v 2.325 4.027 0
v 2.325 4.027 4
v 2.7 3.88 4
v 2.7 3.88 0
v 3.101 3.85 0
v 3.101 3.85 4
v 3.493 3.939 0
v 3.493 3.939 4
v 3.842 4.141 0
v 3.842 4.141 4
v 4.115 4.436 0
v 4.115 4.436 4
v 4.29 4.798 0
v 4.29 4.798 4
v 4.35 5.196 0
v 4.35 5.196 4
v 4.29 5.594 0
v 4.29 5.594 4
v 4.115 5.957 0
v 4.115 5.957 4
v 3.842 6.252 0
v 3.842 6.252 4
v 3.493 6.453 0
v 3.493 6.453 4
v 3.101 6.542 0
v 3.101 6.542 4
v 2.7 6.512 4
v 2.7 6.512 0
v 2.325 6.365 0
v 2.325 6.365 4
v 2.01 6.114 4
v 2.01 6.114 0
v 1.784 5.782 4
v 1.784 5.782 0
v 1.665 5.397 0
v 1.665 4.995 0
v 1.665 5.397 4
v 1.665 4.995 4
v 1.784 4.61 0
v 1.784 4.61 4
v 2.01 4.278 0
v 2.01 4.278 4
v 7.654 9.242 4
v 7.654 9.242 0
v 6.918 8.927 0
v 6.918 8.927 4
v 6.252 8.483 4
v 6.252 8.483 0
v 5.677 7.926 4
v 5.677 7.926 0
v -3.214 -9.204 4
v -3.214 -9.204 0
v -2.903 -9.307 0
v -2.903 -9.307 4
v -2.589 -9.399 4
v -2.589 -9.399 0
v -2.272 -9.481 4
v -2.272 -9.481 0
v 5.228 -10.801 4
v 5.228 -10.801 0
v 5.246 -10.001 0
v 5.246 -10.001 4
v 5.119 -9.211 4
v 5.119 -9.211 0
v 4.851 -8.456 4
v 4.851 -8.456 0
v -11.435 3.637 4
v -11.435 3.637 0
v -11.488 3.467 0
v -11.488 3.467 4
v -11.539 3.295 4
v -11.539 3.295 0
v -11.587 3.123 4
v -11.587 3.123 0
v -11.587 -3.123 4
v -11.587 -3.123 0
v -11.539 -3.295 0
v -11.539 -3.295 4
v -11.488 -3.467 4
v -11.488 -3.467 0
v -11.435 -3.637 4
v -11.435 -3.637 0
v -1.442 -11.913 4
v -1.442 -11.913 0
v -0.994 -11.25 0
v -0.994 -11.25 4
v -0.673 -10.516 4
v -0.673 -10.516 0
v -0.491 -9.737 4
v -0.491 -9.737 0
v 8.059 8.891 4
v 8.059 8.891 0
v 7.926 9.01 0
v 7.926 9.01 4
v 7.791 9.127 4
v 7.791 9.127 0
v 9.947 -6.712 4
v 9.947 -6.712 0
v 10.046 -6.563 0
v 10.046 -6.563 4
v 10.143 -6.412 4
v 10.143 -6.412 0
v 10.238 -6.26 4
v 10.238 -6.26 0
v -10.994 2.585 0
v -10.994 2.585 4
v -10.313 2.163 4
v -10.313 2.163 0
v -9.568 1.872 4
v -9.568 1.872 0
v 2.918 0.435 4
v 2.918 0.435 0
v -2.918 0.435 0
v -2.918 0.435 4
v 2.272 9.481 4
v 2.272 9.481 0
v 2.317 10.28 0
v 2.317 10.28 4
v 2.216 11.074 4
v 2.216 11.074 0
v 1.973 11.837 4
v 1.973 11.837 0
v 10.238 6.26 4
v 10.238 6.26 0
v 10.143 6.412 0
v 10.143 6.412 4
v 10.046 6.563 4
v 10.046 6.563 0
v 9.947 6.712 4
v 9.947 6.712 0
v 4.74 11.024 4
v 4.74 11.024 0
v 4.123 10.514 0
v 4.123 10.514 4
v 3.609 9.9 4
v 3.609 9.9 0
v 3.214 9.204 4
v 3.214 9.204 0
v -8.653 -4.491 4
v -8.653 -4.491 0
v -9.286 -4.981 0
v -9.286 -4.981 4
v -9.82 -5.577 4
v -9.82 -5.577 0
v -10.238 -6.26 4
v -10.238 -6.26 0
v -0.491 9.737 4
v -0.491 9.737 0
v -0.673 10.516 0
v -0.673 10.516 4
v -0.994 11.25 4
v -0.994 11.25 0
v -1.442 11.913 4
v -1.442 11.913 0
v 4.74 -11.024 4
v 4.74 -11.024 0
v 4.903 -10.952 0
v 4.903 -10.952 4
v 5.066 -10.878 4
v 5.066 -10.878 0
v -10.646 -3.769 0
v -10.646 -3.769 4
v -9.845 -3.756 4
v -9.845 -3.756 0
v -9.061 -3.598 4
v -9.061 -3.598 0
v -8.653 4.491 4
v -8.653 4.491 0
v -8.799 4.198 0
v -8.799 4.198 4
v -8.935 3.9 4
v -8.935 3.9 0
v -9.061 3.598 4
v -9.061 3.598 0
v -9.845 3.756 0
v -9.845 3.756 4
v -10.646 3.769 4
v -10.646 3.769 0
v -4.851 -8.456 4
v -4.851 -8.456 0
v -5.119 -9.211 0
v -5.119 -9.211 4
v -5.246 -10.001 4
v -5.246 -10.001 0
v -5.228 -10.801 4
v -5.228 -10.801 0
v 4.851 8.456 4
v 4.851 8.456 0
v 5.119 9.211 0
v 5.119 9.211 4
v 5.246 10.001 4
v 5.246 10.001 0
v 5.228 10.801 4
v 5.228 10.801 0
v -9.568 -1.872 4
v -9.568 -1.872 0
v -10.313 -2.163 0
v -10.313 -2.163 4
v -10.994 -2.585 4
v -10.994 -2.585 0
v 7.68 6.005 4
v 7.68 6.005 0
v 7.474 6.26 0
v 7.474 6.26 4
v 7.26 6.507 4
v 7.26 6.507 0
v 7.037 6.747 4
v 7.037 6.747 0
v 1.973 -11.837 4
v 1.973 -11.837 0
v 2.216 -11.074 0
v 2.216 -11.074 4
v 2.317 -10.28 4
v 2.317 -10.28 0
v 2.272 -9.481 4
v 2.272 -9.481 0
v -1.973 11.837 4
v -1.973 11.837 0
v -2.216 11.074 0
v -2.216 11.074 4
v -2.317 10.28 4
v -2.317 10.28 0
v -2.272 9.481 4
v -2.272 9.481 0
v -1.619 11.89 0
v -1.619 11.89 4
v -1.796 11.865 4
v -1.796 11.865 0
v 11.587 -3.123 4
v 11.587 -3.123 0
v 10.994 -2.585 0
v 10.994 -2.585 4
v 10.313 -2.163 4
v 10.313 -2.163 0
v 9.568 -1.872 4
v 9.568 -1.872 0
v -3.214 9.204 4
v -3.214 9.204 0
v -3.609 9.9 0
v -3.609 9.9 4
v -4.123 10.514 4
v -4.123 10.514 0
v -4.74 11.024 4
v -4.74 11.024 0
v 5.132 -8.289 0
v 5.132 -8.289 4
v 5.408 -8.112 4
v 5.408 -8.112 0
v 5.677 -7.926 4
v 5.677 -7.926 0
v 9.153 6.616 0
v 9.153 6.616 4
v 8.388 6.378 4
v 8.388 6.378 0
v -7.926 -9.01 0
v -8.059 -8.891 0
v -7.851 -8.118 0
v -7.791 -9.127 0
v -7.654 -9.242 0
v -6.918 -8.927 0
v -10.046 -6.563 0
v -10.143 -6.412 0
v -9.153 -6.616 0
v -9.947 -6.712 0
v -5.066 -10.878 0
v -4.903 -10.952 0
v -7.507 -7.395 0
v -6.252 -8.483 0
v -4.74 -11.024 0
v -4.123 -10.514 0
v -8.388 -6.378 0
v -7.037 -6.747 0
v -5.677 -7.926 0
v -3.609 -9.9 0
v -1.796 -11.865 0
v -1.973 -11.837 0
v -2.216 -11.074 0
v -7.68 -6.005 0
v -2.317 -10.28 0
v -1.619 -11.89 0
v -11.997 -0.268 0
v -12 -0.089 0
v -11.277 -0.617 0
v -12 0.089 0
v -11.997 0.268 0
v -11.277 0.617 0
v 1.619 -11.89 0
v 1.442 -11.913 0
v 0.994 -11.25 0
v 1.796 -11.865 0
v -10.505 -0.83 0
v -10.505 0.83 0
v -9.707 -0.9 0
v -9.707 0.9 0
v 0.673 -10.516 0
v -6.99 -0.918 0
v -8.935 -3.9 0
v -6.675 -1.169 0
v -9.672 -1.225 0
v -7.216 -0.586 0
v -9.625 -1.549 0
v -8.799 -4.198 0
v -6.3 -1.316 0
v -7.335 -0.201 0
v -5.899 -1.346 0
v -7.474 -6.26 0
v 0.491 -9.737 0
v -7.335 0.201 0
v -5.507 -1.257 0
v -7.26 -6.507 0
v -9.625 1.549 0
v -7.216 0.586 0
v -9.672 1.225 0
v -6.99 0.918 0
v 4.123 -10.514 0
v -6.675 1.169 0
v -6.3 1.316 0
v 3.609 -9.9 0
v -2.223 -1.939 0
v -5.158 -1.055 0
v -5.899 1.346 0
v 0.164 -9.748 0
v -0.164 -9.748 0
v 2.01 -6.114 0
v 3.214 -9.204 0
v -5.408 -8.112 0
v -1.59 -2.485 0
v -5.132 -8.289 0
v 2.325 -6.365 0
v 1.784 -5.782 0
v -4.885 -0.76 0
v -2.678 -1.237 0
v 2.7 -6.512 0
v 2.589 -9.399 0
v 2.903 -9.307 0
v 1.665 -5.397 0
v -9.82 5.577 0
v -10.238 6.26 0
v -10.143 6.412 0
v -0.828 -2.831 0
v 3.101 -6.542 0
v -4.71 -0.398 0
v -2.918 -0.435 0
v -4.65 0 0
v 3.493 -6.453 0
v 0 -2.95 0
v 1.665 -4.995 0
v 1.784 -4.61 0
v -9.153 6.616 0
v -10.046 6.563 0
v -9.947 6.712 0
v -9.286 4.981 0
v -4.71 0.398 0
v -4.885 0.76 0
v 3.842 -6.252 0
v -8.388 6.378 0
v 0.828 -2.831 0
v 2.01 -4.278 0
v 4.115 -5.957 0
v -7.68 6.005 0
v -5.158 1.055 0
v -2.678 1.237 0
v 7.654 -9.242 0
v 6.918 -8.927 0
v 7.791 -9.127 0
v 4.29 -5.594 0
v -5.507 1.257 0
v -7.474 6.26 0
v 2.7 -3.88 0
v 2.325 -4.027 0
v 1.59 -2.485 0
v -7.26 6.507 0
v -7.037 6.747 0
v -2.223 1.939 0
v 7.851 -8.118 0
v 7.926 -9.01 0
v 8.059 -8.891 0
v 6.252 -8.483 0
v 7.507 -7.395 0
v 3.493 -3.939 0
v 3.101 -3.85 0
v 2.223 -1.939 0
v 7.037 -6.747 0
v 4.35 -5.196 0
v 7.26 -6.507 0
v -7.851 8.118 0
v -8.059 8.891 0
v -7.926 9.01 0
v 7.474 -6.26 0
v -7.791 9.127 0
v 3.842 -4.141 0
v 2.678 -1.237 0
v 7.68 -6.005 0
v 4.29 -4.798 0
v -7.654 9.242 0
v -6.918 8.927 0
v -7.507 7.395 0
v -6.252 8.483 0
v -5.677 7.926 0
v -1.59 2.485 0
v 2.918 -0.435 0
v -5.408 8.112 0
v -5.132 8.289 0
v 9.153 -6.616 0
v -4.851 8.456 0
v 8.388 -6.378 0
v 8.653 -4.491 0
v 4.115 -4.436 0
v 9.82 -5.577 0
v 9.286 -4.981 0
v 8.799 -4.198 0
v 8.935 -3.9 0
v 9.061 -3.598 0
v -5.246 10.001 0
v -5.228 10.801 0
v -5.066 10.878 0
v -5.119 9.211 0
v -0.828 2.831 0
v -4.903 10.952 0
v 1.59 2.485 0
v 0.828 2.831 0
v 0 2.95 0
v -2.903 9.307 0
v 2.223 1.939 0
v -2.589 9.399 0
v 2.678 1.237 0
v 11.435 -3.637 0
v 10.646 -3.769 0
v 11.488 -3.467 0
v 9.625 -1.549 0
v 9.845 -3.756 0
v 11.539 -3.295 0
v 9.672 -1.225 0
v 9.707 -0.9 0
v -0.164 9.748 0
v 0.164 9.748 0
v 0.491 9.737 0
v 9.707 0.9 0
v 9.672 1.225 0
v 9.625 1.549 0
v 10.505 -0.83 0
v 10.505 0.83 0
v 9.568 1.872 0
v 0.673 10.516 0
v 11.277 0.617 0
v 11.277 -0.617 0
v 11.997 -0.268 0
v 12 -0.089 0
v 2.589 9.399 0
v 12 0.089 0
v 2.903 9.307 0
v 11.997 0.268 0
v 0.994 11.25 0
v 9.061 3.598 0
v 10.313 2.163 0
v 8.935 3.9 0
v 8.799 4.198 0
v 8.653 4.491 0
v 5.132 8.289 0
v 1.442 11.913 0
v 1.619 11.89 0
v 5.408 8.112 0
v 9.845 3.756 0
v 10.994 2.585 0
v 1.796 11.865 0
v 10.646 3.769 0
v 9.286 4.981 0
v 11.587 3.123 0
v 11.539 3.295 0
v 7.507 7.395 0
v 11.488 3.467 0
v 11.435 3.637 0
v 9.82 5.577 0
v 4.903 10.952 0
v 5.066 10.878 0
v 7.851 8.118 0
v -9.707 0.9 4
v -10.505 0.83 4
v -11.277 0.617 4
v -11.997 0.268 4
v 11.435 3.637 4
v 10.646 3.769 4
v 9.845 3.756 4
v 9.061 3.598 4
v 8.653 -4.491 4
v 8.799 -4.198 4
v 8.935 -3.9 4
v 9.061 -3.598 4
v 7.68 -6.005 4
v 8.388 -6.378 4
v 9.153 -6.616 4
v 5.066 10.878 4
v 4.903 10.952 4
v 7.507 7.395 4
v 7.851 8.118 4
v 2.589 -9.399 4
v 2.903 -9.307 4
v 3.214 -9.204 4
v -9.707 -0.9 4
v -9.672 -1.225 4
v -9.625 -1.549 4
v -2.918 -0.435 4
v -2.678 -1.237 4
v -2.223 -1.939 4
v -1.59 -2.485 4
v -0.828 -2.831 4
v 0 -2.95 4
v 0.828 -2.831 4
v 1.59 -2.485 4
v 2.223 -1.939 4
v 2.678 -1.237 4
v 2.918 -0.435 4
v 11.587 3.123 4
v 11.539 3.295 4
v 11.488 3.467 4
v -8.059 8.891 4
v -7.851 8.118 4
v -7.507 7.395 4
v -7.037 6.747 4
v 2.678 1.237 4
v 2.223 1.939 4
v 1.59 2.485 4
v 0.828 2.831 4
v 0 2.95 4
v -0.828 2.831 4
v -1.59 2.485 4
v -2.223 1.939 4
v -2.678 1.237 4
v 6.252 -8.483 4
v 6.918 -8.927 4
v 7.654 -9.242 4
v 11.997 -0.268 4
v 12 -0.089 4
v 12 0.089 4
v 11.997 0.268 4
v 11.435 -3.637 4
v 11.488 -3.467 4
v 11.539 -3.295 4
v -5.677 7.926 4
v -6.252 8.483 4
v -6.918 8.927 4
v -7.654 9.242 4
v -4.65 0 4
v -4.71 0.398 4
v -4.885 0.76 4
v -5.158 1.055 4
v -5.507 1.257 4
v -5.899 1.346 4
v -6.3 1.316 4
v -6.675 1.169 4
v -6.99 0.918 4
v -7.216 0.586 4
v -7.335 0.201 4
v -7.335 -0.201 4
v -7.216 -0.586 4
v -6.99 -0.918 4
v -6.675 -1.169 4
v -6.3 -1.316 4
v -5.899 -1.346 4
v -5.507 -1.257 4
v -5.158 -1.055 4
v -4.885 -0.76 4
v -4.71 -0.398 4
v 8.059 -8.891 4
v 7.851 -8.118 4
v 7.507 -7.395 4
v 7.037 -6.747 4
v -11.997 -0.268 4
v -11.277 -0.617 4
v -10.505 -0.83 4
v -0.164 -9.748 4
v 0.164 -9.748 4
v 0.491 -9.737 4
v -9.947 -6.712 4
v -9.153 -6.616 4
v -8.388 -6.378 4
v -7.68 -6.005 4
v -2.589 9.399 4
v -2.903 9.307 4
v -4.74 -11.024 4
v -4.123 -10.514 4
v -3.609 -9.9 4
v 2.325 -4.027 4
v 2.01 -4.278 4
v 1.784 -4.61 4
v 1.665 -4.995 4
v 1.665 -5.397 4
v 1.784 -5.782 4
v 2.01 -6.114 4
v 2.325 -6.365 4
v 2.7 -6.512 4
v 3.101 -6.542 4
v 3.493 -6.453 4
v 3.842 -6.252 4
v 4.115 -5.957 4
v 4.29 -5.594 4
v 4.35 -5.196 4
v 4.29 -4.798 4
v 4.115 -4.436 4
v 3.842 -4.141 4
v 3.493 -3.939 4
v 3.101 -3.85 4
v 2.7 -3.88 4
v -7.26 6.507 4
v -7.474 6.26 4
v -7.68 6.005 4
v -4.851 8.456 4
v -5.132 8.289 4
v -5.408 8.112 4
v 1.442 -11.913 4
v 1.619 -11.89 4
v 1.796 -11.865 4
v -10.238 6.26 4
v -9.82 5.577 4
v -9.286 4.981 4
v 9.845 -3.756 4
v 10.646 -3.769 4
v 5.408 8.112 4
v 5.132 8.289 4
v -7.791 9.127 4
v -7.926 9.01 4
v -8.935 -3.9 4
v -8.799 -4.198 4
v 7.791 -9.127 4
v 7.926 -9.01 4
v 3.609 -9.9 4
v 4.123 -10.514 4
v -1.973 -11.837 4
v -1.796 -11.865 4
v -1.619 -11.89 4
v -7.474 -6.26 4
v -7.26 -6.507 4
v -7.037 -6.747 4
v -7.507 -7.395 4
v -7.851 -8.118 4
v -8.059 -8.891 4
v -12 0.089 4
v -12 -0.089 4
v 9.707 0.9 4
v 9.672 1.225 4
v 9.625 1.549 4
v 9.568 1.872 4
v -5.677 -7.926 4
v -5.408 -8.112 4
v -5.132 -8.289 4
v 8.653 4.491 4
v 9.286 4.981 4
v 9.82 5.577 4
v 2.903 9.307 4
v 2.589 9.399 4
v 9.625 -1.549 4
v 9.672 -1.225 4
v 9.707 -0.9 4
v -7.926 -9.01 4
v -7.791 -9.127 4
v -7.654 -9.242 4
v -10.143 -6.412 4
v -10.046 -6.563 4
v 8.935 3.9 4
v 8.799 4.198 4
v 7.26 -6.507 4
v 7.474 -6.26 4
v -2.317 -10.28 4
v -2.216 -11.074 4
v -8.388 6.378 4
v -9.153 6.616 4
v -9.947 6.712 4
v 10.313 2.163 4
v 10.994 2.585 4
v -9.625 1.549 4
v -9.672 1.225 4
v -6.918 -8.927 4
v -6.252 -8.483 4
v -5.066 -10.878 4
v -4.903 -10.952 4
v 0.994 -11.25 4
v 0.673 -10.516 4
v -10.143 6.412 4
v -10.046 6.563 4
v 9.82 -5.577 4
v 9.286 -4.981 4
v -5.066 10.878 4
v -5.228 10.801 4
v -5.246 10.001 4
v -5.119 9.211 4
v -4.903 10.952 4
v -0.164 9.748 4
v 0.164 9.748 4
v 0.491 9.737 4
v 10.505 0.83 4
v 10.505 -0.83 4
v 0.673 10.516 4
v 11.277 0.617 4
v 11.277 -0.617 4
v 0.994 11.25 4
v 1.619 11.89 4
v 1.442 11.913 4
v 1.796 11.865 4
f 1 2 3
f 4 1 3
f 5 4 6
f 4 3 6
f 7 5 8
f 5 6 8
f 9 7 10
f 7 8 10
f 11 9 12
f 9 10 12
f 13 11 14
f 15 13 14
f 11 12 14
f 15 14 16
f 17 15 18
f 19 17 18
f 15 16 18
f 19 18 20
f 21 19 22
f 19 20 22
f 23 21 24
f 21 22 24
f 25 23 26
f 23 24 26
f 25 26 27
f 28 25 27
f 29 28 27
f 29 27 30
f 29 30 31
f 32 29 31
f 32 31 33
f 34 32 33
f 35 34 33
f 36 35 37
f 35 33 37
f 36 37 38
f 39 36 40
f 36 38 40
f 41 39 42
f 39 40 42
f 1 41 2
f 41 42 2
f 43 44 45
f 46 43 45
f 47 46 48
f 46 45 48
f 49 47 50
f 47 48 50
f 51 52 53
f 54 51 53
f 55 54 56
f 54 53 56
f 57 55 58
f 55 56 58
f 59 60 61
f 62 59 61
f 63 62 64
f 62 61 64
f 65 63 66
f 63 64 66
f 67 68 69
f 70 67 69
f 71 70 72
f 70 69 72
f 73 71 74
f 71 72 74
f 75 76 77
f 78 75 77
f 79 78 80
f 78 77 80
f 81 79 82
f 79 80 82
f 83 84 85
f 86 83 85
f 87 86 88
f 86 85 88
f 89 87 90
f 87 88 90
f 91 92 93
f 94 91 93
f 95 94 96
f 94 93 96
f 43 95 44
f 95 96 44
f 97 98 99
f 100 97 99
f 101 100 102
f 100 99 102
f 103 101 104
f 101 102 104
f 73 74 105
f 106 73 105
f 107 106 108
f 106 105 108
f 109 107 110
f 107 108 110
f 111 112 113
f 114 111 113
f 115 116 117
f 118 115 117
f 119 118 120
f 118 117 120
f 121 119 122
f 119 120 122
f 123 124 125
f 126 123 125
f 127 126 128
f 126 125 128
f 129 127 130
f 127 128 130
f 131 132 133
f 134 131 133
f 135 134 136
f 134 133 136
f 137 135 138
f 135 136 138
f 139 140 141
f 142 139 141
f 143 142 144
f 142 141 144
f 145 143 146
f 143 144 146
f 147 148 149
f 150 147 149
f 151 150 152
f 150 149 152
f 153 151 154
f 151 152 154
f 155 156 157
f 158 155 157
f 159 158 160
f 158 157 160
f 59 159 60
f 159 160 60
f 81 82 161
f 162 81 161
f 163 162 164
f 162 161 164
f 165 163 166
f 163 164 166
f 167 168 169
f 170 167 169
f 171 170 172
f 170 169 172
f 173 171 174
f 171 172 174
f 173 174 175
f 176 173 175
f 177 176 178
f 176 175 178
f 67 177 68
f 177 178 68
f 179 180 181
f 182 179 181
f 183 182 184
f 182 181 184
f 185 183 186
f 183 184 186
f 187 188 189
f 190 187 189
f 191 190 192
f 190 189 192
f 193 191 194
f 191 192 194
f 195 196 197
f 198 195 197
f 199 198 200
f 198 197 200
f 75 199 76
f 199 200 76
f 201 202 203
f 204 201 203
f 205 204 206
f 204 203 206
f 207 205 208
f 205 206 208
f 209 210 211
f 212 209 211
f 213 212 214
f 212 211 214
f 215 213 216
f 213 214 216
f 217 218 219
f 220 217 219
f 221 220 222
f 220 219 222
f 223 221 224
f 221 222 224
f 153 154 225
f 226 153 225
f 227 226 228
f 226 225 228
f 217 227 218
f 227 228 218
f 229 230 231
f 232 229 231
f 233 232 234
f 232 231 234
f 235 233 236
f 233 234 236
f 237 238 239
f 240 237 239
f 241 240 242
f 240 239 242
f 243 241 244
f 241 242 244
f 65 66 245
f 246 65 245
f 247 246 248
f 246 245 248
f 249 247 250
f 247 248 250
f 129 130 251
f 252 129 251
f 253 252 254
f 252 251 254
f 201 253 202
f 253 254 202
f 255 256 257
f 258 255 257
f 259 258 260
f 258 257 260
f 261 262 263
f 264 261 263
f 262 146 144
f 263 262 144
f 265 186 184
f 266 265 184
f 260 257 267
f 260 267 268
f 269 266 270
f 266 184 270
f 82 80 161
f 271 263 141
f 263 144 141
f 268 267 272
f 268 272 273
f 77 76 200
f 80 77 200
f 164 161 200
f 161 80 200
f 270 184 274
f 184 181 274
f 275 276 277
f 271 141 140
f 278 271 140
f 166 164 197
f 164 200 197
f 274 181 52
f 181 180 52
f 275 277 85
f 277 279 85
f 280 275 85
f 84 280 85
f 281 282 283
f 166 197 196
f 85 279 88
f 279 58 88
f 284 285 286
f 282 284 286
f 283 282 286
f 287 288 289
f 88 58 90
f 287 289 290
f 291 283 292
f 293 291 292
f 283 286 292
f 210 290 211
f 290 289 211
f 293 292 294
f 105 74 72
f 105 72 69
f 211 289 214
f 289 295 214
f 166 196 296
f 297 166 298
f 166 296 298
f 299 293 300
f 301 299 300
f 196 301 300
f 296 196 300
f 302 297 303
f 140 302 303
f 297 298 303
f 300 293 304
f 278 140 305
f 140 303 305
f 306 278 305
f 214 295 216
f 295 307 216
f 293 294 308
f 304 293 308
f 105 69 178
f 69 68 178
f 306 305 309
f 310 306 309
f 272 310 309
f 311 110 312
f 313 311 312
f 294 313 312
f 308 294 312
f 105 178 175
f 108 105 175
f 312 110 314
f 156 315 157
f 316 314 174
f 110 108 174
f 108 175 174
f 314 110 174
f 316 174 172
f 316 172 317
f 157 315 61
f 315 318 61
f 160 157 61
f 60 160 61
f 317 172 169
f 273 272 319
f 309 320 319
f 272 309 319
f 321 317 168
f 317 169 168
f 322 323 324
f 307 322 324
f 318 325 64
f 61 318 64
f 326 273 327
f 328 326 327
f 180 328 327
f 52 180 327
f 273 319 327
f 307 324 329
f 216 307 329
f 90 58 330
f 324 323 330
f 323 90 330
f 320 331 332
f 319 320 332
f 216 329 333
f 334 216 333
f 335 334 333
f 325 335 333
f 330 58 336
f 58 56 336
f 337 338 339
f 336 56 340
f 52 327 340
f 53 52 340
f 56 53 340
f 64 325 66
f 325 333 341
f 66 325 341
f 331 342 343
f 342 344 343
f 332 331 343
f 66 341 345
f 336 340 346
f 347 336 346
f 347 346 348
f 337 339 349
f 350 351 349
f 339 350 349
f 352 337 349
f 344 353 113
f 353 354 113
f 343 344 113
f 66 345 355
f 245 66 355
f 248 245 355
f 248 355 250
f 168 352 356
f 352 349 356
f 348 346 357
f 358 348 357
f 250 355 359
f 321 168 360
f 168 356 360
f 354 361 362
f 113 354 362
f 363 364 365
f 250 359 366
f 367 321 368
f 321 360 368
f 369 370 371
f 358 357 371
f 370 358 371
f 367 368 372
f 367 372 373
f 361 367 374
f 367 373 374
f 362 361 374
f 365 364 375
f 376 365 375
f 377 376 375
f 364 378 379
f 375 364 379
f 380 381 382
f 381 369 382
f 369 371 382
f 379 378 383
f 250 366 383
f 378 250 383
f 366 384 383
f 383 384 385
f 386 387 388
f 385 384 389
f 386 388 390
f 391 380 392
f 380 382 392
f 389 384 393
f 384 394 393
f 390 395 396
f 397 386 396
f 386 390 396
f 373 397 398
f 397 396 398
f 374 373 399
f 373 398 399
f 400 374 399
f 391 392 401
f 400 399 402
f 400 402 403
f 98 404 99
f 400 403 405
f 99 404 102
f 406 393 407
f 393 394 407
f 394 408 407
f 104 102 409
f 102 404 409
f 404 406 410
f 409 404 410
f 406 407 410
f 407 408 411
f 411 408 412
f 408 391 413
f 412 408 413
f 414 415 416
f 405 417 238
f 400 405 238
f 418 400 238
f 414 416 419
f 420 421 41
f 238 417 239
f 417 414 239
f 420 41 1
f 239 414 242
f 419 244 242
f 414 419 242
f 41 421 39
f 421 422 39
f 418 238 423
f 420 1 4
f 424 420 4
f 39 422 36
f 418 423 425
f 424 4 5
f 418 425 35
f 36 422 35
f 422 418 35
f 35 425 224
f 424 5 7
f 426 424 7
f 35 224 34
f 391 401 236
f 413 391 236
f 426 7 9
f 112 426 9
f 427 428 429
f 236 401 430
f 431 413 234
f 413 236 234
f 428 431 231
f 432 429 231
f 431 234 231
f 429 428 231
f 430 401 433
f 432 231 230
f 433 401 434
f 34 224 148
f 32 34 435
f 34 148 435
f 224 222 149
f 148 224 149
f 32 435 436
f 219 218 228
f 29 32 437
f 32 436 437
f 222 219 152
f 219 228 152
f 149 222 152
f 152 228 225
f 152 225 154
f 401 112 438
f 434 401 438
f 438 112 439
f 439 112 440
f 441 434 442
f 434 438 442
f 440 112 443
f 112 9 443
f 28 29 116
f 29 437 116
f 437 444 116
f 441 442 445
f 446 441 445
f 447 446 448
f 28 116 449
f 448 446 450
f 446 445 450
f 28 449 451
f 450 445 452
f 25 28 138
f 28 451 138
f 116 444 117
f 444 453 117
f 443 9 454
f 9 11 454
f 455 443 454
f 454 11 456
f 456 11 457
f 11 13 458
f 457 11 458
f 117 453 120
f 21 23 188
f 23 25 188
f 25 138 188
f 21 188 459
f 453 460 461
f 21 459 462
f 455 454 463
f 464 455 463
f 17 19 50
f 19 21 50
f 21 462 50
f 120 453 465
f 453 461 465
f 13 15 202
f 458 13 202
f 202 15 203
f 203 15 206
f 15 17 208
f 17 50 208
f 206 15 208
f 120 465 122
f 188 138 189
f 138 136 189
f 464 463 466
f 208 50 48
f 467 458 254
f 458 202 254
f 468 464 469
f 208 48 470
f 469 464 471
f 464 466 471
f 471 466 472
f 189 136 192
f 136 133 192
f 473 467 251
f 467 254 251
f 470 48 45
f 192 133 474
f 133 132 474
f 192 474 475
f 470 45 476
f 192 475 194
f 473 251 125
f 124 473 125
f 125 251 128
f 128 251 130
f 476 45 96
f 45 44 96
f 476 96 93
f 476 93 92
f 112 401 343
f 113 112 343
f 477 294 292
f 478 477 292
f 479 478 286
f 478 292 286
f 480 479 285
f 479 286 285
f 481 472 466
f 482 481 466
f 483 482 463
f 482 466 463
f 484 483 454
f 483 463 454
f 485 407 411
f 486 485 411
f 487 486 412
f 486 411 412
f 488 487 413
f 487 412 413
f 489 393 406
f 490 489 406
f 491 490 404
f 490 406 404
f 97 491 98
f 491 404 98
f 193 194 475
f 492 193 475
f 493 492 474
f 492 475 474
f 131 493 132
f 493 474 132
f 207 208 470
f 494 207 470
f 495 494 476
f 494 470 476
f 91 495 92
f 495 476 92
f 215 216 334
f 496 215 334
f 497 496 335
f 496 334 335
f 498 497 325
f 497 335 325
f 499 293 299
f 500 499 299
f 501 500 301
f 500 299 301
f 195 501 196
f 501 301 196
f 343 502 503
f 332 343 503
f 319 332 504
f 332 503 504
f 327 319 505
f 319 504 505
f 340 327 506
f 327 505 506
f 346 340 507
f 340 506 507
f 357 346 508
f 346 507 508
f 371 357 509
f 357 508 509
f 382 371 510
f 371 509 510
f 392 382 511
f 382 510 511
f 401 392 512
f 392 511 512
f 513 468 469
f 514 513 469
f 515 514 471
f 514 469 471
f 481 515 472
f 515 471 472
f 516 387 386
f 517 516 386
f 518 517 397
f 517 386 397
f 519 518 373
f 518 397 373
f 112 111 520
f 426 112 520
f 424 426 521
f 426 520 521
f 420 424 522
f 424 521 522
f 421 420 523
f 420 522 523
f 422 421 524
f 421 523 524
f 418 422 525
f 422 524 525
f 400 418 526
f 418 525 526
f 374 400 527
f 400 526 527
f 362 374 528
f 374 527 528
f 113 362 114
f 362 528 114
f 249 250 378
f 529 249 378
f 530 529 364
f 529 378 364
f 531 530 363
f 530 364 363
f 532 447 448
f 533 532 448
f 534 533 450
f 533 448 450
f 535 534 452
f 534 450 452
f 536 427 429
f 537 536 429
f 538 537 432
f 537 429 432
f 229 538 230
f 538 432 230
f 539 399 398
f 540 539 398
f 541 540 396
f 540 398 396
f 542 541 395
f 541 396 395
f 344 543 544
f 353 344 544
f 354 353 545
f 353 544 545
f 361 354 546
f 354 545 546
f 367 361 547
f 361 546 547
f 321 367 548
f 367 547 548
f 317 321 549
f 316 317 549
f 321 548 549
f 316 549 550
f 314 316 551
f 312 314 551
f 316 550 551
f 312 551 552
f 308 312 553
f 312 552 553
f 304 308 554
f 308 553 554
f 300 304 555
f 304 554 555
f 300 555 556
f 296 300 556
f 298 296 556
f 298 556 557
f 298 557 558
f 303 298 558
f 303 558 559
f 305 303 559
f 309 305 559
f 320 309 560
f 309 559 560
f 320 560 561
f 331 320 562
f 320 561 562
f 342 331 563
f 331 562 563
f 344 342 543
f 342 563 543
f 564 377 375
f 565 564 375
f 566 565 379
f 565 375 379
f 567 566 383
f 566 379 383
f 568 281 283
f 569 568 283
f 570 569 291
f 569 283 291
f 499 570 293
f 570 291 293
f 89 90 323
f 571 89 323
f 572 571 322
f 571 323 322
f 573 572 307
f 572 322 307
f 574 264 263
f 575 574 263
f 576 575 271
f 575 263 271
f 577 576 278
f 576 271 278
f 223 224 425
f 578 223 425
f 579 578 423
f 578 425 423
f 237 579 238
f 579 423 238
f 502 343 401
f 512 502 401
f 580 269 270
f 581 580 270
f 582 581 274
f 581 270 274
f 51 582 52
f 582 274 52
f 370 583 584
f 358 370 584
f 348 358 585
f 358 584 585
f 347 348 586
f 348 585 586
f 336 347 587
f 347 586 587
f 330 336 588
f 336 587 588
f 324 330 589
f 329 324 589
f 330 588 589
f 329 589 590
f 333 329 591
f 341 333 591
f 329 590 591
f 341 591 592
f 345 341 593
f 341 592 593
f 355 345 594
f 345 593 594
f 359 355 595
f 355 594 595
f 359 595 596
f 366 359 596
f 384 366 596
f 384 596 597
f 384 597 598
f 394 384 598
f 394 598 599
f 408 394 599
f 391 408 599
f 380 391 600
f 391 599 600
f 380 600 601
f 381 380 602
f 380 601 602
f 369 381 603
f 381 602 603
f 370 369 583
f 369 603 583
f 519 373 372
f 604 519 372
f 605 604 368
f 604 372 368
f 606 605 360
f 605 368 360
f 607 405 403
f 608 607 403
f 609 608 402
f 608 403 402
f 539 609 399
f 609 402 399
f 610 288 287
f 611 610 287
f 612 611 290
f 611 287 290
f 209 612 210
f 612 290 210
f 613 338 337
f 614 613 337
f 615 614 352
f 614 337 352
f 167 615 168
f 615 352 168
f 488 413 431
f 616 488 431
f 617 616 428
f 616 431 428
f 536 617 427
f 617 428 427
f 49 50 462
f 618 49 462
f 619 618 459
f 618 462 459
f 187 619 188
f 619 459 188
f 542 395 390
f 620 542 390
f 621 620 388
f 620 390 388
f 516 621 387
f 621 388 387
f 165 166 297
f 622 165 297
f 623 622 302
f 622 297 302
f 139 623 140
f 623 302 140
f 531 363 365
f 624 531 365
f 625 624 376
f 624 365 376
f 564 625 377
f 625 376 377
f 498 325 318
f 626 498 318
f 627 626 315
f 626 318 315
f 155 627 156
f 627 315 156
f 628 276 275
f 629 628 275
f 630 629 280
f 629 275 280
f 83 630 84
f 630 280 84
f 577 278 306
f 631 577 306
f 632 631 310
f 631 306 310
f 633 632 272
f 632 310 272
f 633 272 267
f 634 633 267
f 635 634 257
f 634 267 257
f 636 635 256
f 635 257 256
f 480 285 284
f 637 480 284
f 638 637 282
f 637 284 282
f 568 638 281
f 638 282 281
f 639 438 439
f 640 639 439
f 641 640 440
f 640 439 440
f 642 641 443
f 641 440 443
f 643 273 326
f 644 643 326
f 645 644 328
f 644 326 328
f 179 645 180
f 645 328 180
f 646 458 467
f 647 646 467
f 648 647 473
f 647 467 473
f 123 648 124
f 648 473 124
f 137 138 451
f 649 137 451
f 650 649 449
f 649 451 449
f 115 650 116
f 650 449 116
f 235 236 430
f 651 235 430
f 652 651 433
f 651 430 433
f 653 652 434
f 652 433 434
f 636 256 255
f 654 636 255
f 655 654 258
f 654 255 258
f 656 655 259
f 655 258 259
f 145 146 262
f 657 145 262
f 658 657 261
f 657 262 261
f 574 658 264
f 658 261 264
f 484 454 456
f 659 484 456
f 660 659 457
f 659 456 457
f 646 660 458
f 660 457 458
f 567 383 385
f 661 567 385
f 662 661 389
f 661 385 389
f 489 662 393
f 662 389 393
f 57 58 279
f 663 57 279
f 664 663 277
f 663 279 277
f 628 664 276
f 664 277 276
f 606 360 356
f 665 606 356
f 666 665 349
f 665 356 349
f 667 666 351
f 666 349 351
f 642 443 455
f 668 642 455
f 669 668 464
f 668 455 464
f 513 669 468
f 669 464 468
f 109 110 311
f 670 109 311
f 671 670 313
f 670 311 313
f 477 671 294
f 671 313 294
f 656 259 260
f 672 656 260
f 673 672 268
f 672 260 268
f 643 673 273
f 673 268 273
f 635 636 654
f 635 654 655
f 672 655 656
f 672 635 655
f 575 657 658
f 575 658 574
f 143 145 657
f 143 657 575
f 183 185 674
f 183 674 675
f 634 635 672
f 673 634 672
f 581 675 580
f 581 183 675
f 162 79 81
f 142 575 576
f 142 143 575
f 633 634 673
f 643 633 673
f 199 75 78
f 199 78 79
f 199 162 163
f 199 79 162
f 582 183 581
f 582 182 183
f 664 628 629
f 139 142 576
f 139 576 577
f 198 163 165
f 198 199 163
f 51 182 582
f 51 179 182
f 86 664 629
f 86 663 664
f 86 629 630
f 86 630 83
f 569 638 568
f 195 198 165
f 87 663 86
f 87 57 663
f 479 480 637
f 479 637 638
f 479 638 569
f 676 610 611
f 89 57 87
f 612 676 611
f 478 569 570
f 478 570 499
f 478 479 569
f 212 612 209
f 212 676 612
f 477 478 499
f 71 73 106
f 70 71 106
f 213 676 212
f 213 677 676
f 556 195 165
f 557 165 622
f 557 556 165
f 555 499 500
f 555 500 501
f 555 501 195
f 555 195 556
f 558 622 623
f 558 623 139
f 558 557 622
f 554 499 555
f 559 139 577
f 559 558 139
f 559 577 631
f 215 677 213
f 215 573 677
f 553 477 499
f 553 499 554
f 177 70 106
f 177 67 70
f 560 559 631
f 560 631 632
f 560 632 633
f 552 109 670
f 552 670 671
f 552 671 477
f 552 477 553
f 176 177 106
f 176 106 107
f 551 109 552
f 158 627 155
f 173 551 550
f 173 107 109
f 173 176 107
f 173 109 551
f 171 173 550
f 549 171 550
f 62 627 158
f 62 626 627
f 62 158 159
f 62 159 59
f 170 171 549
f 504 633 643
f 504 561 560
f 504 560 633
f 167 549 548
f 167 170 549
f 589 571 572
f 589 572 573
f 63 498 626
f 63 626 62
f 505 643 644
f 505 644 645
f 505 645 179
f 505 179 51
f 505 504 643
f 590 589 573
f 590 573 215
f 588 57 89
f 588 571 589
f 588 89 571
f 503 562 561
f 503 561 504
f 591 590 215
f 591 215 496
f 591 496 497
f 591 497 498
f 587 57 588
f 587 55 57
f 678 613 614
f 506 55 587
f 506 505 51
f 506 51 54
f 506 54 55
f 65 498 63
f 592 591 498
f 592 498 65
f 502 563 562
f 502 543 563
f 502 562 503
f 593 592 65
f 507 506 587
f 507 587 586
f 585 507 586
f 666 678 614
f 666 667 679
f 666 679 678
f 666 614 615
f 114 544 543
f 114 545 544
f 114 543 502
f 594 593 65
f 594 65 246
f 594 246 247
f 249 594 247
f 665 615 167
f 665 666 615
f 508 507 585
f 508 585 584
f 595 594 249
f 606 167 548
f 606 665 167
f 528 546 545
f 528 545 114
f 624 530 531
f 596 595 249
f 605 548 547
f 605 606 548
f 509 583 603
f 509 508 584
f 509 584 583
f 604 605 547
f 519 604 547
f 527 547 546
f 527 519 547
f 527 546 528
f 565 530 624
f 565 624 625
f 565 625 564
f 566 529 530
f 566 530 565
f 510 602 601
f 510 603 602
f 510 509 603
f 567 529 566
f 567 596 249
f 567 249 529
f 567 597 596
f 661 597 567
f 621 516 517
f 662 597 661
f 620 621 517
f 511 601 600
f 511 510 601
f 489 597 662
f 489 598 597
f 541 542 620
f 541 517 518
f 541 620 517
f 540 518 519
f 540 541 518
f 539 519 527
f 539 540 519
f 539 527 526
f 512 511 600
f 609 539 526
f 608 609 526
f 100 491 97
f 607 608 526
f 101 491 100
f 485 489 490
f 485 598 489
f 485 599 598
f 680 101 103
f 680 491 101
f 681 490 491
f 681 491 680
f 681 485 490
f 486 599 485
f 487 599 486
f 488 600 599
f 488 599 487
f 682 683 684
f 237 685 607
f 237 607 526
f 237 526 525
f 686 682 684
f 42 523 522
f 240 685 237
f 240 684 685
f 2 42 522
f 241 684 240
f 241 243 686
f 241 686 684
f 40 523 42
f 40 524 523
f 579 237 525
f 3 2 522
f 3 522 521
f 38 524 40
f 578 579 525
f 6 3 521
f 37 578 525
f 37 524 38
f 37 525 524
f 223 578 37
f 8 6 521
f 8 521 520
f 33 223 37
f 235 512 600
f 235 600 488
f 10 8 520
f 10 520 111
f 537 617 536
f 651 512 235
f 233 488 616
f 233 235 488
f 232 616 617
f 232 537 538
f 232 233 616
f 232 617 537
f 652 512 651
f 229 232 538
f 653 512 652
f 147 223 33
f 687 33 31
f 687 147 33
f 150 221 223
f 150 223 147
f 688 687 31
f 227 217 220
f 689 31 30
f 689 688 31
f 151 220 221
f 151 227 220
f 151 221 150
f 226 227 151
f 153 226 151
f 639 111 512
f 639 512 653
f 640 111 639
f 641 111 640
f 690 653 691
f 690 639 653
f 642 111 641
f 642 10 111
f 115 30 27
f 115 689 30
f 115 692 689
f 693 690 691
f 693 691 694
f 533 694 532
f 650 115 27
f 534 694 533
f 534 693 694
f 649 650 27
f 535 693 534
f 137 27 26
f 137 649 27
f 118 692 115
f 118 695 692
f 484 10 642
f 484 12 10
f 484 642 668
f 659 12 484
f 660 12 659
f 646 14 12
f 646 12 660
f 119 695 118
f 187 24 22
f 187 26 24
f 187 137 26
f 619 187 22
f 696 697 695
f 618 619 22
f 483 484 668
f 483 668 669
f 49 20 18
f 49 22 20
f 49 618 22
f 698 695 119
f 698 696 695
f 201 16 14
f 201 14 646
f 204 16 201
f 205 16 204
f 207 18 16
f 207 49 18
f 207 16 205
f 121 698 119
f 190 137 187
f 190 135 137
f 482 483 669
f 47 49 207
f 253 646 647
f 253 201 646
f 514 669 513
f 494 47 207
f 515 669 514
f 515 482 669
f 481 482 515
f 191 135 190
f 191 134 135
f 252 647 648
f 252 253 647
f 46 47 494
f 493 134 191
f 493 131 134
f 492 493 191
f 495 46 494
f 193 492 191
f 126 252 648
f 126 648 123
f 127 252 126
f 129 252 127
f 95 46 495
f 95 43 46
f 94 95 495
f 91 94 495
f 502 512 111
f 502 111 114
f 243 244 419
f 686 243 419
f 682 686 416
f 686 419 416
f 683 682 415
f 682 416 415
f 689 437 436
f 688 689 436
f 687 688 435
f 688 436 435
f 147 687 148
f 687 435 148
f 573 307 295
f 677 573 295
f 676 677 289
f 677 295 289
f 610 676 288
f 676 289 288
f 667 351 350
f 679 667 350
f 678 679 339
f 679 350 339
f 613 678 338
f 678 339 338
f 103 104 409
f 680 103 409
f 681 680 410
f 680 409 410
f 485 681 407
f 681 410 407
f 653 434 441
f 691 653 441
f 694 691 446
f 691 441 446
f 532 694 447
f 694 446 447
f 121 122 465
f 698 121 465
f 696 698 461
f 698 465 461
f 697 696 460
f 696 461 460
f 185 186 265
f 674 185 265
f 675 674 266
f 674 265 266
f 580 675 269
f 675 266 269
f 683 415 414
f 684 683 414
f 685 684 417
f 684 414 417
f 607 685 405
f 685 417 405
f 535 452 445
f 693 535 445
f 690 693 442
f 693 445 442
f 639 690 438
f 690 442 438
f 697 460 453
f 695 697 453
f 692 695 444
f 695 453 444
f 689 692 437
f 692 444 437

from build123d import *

# Parameters (mm, degrees)
MODEL_R             = 2.5
BOSS_EXTRUDE1_DEPTH = 4
SKETCH2_R           = 2.95
CUT_EXTRUDE1_DEPTH  = 4
SKETCH3_R           = 1.35
CUT_EXTRUDE2_DEPTH  = 4
CIRPATTERN1_COUNT   = 3
BOSS_EXTRUDE2_DEPTH = 4


with BuildPart() as part:
    # Model → Boss-Extrude1 (new body)
    with BuildSketch(Plane.XY):
        with BuildLine():
            ThreePointArc((-11.997000624, 0.268283487), (-12, 0), (-11.997000624, -0.268283487))
            ThreePointArc((-11.997000624, -0.268283487), (-10.895606779, -0.741380557), (-9.707399683, -0.89966238))
            ThreePointArc((-9.707399683, -0.89966238), (-9.649769237, -1.387427358), (-9.56764597, -1.8716708))
            ThreePointArc((-9.56764597, -1.8716708), (-10.663129188, -2.358297721), (-11.586621996, -3.122529539))
            ThreePointArc((-11.586621996, -3.122529539), (-11.513915683, -3.380790682), (-11.43545361, -3.637361781))
            ThreePointArc((-11.43545361, -3.637361781), (-10.245387108, -3.780996591), (-9.060717605, -3.598110265))
            ThreePointArc((-9.060717605, -3.598110265), (-8.868002323, -4.049880962), (-8.652778483, -4.491372344))
            ThreePointArc((-8.652778483, -4.491372344), (-9.566788286, -5.266920743), (-10.237564162, -6.260373793))
            ThreePointArc((-10.237564162, -6.260373793), (-10.095042394, -6.487689809), (-9.947474154, -6.711762656))
            ThreePointArc((-9.947474154, -6.711762656), (-8.765147105, -6.514298768), (-7.679990073, -6.005060656))
            ThreePointArc((-7.679990073, -6.005060656), (-7.3678026, -6.384237295), (-7.036914342, -6.747209612))
            ThreePointArc((-7.036914342, -6.747209612), (-7.695403093, -7.74884917), (-8.059119765, -8.891039794))
            ThreePointArc((-8.059119765, -8.891039794), (-7.858328807, -9.068994892), (-7.653609502, -9.242416436))
            ThreePointArc((-7.653609502, -9.242416436), (-6.574807012, -8.719851201), (-5.67707542, -7.925516745))
            ThreePointArc((-5.67707542, -7.925516745), (-5.270707329, -8.201380692), (-4.850961252, -8.456428084))
            ThreePointArc((-4.850961252, -8.456428084), (-5.200582107, -9.603011921), (-5.227773414, -10.801406627))
            ThreePointArc((-5.227773414, -10.801406627), (-4.984980156, -10.915583944), (-4.739694926, -11.024304604))
            ThreePointArc((-4.739694926, -11.024304604), (-3.851815156, -10.218973149), (-3.214237879, -9.203894603))
            ThreePointArc((-3.214237879, -9.203894603), (-2.746610697, -9.354097), (-2.27201213, -9.480557045))
            ThreePointArc((-2.27201213, -9.480557045), (-2.284440889, -10.679195758), (-1.972903952, -11.836707735))
            ThreePointArc((-1.972903952, -11.836707735), (-1.707778059, -11.877857303), (-1.441798455, -11.913069177))
            ThreePointArc((-1.441798455, -11.913069177), (-0.816772145, -10.890214666), (-0.491001901, -9.736627657))
            ThreePointArc((-0.491001901, -9.736627657), (0, -9.749), (0.491001901, -9.736627657))
            ThreePointArc((0.491001901, -9.736627657), (0.816772145, -10.890214666), (1.441798455, -11.913069177))
            ThreePointArc((1.441798455, -11.913069177), (1.707778059, -11.877857303), (1.972903952, -11.836707735))
            ThreePointArc((1.972903952, -11.836707735), (2.284440889, -10.679195758), (2.27201213, -9.480557045))
            ThreePointArc((2.27201213, -9.480557045), (2.746610697, -9.354097), (3.214237879, -9.203894603))
            ThreePointArc((3.214237879, -9.203894603), (3.851815156, -10.218973149), (4.739694926, -11.024304604))
            ThreePointArc((4.739694926, -11.024304604), (4.984980156, -10.915583944), (5.227773414, -10.801406627))
            ThreePointArc((5.227773414, -10.801406627), (5.200582107, -9.603011921), (4.850961252, -8.456428084))
            ThreePointArc((4.850961252, -8.456428084), (5.270707329, -8.201380692), (5.67707542, -7.925516745))
            ThreePointArc((5.67707542, -7.925516745), (6.574807012, -8.719851201), (7.653609502, -9.242416436))
            ThreePointArc((7.653609502, -9.242416436), (7.858328807, -9.068994892), (8.059119765, -8.891039794))
            ThreePointArc((8.059119765, -8.891039794), (7.695403093, -7.74884917), (7.036914342, -6.747209612))
            ThreePointArc((7.036914342, -6.747209612), (7.3678026, -6.384237295), (7.679990073, -6.005060656))
            ThreePointArc((7.679990073, -6.005060656), (8.765147105, -6.514298768), (9.947474154, -6.711762656))
            ThreePointArc((9.947474154, -6.711762656), (10.095042394, -6.487689809), (10.237564162, -6.260373793))
            ThreePointArc((10.237564162, -6.260373793), (9.566788286, -5.266920743), (8.652778482, -4.491372344))
            ThreePointArc((8.652778482, -4.491372344), (8.868002323, -4.049880962), (9.060717605, -3.598110265))
            ThreePointArc((9.060717605, -3.598110265), (10.245387108, -3.780996591), (11.43545361, -3.637361781))
            ThreePointArc((11.43545361, -3.637361781), (11.513915683, -3.380790682), (11.586621996, -3.122529539))
            ThreePointArc((11.586621996, -3.122529539), (10.663129188, -2.358297721), (9.56764597, -1.8716708))
            ThreePointArc((9.56764597, -1.8716708), (9.649769237, -1.387427358), (9.707399683, -0.89966238))
            ThreePointArc((9.707399683, -0.89966238), (10.895606779, -0.741380557), (11.997000624, -0.268283487))
            ThreePointArc((11.997000624, -0.268283487), (12, 0), (11.997000624, 0.268283487))
            ThreePointArc((11.997000624, 0.268283487), (10.895606779, 0.741380557), (9.707399683, 0.89966238))
            ThreePointArc((9.707399683, 0.89966238), (9.649769237, 1.387427358), (9.56764597, 1.8716708))
            ThreePointArc((9.56764597, 1.8716708), (10.663129188, 2.358297721), (11.586621996, 3.122529539))
            ThreePointArc((11.586621996, 3.122529539), (11.513915683, 3.380790682), (11.43545361, 3.637361781))
            ThreePointArc((11.43545361, 3.637361781), (10.245387108, 3.780996591), (9.060717605, 3.598110265))
            ThreePointArc((9.060717605, 3.598110265), (8.868002323, 4.049880962), (8.652778483, 4.491372344))
            ThreePointArc((8.652778483, 4.491372344), (9.566788286, 5.266920743), (10.237564162, 6.260373793))
            ThreePointArc((10.237564162, 6.260373793), (10.095042394, 6.487689809), (9.947474154, 6.711762656))
            ThreePointArc((9.947474154, 6.711762656), (8.765147105, 6.514298768), (7.679990073, 6.005060656))
            ThreePointArc((7.679990073, 6.005060656), (7.3678026, 6.384237295), (7.036914342, 6.747209612))
            ThreePointArc((7.036914342, 6.747209612), (7.695403093, 7.74884917), (8.059119765, 8.891039794))
            ThreePointArc((8.059119765, 8.891039794), (7.858328807, 9.068994892), (7.653609502, 9.242416436))
            ThreePointArc((7.653609502, 9.242416436), (6.574807012, 8.719851201), (5.67707542, 7.925516745))
            ThreePointArc((5.67707542, 7.925516745), (5.270707329, 8.201380692), (4.850961252, 8.456428084))
            ThreePointArc((4.850961252, 8.456428084), (5.200582107, 9.603011921), (5.227773414, 10.801406627))
            ThreePointArc((5.227773414, 10.801406627), (4.984980156, 10.915583944), (4.739694926, 11.024304604))
            ThreePointArc((4.739694926, 11.024304604), (3.851815156, 10.218973149), (3.214237879, 9.203894603))
            ThreePointArc((3.214237879, 9.203894603), (2.746610697, 9.354097), (2.27201213, 9.480557045))
            ThreePointArc((2.27201213, 9.480557045), (2.284440889, 10.679195758), (1.972903952, 11.836707735))
            ThreePointArc((1.972903952, 11.836707735), (1.707778059, 11.877857303), (1.441798455, 11.913069177))
            ThreePointArc((1.441798455, 11.913069177), (0.816772145, 10.890214666), (0.491001901, 9.736627657))
            ThreePointArc((0.491001901, 9.736627657), (0, 9.749), (-0.491001901, 9.736627657))
            ThreePointArc((-0.491001901, 9.736627657), (-0.816772145, 10.890214666), (-1.441798455, 11.913069177))
            ThreePointArc((-1.441798455, 11.913069177), (-1.707778059, 11.877857303), (-1.972903952, 11.836707735))
            ThreePointArc((-1.972903952, 11.836707735), (-2.284440889, 10.679195758), (-2.27201213, 9.480557045))
            ThreePointArc((-2.27201213, 9.480557045), (-2.746610697, 9.354097), (-3.214237879, 9.203894603))
            ThreePointArc((-3.214237879, 9.203894603), (-3.851815156, 10.218973149), (-4.739694926, 11.024304604))
            ThreePointArc((-4.739694926, 11.024304604), (-4.984980156, 10.915583944), (-5.227773414, 10.801406627))
            ThreePointArc((-5.227773414, 10.801406627), (-5.200582107, 9.603011921), (-4.850961252, 8.456428084))
            ThreePointArc((-4.850961252, 8.456428084), (-5.270707329, 8.201380692), (-5.67707542, 7.925516745))
            ThreePointArc((-5.67707542, 7.925516745), (-6.574807012, 8.719851201), (-7.653609502, 9.242416436))
            ThreePointArc((-7.653609502, 9.242416436), (-7.858328807, 9.068994892), (-8.059119765, 8.891039794))
            ThreePointArc((-8.059119765, 8.891039794), (-7.695403093, 7.74884917), (-7.036914342, 6.747209612))
            ThreePointArc((-7.036914342, 6.747209612), (-7.3678026, 6.384237295), (-7.679990073, 6.005060656))
            ThreePointArc((-7.679990073, 6.005060656), (-8.765147105, 6.514298768), (-9.947474154, 6.711762656))
            ThreePointArc((-9.947474154, 6.711762656), (-10.095042394, 6.487689809), (-10.237564162, 6.260373793))
            ThreePointArc((-10.237564162, 6.260373793), (-9.566788286, 5.266920743), (-8.652778482, 4.491372344))
            ThreePointArc((-8.652778482, 4.491372344), (-8.868002323, 4.049880962), (-9.060717605, 3.598110265))
            ThreePointArc((-9.060717605, 3.598110265), (-10.245387108, 3.780996591), (-11.43545361, 3.637361781))
            ThreePointArc((-11.43545361, 3.637361781), (-11.513915683, 3.380790682), (-11.586621996, 3.122529539))
            ThreePointArc((-11.586621996, 3.122529539), (-10.663129188, 2.358297721), (-9.56764597, 1.8716708))
            ThreePointArc((-9.56764597, 1.8716708), (-9.649769237, 1.387427358), (-9.707399683, 0.89966238))
            ThreePointArc((-9.707399683, 0.89966238), (-10.895606779, 0.741380557), (-11.997000624, 0.268283487))
        make_face()
        Circle(MODEL_R, mode=Mode.SUBTRACT)
    extrude(amount=BOSS_EXTRUDE1_DEPTH)

    # Sketch2 → Cut-Extrude1 (cut)
    with BuildSketch(Plane.XY.offset(4)):
        Circle(SKETCH2_R)
    extrude(amount=-CUT_EXTRUDE1_DEPTH, mode=Mode.SUBTRACT)

    # Sketch3 → Cut-Extrude2 (cut)
    with BuildSketch(Plane.XY.offset(4)):
        with Locations((-6, 0)):
            Circle(SKETCH3_R)
    cut_extrude2 = extrude(amount=-CUT_EXTRUDE2_DEPTH, mode=Mode.SUBTRACT)

    # CirPattern1: Cut-Extrude2 ×3 about axis
    cirpattern1_axis = Axis((0, 0, 0), (0, 0, 1))
    for i in range(1, CIRPATTERN1_COUNT):
        add(cut_extrude2.rotate(cirpattern1_axis, i * 360 / CIRPATTERN1_COUNT), mode=Mode.SUBTRACT)

    # Sketch5 → Boss-Extrude2 (add)
    with BuildSketch(Plane.XY):
        with BuildLine():
            ThreePointArc((-2.95, 0), (-2.941926879, -0.218096855), (-2.917751703, -0.435))
            Line((-2.917751703, -0.435), (2.917751703, -0.435))
            ThreePointArc((2.917751703, -0.435), (2.941926879, -0.218096855), (2.95, 0))
            ThreePointArc((2.95, 0), (2.941926879, 0.218096855), (2.917751703, 0.435))
            Line((2.917751703, 0.435), (-2.917751703, 0.435))
            ThreePointArc((-2.917751703, 0.435), (-2.941926879, 0.218096855), (-2.95, 0))
        make_face()
    extrude(amount=BOSS_EXTRUDE2_DEPTH)


solid = part.part
